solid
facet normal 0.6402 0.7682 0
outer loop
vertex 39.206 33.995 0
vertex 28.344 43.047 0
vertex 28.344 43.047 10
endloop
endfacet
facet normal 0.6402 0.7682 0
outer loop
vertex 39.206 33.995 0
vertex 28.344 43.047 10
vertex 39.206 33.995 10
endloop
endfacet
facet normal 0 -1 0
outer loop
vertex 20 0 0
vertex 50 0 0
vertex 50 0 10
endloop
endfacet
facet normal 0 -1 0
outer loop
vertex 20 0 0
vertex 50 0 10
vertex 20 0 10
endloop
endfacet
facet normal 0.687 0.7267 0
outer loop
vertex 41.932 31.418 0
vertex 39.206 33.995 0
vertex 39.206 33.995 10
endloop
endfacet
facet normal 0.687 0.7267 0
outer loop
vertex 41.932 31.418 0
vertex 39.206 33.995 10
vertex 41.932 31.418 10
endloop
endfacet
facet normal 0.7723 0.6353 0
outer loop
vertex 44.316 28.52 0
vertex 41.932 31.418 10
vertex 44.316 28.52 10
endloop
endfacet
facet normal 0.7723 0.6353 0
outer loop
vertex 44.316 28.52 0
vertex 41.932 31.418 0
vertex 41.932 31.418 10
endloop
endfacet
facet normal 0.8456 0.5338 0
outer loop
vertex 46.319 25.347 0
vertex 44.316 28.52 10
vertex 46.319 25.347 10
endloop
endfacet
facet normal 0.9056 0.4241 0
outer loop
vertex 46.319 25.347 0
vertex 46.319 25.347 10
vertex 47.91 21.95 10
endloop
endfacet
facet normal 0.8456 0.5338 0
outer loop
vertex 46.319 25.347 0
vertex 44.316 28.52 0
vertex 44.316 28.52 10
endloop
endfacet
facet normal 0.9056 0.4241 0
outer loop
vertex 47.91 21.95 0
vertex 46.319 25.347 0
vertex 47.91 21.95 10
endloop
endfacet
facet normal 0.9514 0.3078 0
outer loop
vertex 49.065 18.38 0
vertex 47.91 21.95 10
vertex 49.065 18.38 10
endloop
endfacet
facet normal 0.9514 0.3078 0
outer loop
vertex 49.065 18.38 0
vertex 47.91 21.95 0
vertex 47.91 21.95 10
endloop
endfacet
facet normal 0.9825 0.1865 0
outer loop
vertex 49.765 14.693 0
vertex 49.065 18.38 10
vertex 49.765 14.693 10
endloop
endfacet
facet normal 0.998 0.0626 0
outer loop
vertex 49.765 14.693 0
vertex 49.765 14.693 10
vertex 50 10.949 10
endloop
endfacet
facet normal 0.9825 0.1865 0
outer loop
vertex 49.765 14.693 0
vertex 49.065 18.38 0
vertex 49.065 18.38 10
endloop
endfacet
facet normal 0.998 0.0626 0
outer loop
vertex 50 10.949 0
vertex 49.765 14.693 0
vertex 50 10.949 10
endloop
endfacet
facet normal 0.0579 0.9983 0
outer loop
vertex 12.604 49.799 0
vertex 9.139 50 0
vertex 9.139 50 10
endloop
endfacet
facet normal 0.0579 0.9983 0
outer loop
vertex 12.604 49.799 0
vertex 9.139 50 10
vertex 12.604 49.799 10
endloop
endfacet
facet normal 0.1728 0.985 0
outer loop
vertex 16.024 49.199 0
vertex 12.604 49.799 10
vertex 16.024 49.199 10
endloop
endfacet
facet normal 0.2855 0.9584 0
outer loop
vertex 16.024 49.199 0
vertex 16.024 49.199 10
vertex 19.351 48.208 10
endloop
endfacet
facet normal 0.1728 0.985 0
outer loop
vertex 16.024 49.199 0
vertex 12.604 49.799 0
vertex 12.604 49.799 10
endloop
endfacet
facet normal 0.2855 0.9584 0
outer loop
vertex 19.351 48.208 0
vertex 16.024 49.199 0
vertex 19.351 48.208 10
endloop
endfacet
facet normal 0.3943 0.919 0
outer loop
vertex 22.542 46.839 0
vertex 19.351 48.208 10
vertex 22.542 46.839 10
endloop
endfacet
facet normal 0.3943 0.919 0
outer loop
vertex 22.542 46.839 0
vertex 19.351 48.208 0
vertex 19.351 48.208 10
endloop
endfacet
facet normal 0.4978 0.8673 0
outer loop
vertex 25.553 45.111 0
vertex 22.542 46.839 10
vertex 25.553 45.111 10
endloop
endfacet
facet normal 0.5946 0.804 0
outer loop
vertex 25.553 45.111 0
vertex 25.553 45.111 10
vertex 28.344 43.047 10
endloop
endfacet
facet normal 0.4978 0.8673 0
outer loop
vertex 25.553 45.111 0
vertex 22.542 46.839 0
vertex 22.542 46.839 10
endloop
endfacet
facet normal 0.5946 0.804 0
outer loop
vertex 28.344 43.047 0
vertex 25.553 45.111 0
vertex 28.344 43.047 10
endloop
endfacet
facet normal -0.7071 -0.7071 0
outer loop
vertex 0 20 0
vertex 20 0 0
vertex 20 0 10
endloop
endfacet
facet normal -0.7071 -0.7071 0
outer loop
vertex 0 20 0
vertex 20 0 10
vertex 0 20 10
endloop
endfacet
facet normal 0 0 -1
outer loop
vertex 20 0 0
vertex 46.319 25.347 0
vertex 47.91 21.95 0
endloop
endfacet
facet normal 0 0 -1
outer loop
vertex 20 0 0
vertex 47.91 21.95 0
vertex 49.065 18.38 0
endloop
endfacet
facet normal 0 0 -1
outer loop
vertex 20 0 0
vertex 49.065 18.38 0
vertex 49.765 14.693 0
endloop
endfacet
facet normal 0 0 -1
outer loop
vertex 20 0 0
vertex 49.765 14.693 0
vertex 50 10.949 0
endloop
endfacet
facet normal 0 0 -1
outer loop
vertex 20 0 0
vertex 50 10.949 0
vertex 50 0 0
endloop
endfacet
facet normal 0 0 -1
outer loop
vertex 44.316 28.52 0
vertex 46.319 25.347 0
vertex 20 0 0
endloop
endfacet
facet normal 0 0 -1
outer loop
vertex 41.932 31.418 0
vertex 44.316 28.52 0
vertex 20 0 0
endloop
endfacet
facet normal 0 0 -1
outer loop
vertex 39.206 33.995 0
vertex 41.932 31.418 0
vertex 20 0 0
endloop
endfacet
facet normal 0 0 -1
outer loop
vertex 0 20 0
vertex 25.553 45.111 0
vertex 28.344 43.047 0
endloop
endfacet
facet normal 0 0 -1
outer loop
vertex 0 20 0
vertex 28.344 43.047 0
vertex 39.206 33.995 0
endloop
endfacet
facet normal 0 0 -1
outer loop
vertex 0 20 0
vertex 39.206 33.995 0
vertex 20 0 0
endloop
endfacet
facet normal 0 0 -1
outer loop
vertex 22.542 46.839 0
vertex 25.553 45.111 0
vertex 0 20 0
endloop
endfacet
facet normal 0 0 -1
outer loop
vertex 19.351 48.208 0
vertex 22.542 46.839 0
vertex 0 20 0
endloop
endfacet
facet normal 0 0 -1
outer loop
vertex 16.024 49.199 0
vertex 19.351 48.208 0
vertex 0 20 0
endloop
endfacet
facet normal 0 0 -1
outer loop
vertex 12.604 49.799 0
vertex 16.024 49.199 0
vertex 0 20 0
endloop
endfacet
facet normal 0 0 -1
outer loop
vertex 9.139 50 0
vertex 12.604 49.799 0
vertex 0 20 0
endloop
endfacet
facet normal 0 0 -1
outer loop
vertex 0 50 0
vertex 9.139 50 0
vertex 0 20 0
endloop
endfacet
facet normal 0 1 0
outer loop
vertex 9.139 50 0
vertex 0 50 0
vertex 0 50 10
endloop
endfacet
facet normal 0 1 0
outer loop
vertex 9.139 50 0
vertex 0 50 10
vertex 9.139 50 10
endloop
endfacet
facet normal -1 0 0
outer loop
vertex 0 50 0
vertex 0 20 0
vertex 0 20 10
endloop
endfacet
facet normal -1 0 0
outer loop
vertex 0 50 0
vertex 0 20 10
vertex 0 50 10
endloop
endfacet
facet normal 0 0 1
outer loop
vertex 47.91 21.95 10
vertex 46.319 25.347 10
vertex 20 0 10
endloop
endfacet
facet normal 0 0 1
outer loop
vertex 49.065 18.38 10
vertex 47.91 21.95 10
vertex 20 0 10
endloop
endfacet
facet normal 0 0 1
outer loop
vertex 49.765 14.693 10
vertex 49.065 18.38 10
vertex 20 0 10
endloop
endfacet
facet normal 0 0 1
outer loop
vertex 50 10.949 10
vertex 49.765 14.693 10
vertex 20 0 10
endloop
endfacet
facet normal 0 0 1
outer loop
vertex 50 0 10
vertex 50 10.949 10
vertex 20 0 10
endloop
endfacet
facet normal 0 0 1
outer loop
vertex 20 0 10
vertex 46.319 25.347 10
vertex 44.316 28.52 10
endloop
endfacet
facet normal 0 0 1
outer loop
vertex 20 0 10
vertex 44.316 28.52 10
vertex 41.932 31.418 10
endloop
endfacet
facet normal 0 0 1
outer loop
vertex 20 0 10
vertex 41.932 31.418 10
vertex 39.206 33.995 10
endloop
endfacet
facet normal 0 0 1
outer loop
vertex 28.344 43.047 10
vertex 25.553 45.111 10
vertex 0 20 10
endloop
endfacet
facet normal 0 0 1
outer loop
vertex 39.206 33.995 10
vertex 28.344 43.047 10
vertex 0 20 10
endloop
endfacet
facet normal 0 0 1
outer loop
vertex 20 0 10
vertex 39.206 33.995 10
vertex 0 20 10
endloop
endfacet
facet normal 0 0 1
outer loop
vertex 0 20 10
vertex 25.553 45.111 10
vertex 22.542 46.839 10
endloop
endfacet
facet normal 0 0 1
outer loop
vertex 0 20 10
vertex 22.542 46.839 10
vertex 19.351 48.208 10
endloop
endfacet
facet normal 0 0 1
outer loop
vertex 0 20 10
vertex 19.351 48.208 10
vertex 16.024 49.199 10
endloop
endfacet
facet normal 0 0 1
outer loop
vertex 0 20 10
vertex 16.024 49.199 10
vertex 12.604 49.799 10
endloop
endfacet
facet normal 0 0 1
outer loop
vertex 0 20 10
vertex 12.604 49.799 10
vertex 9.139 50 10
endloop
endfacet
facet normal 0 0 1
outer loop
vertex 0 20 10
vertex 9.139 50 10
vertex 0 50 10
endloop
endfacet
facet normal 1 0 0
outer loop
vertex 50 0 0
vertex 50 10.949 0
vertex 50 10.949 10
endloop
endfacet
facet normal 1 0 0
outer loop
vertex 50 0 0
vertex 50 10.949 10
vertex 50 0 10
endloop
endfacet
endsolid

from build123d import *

# Parameters (mm, degrees)
BOSS_EXTRU_1_DEPTH = 10


with BuildPart() as part:
    # Esquisse1 → Boss.-Extru.1 (new body)
    with BuildSketch(Plane.XY):
        with BuildLine():
            Line((0, 20), (0, 50))
            Line((0, 50), (9.138501945, 50))
            ThreePointArc((9.138501945, 50), (19.351259857, 48.20814733), (28.344033934, 43.046638388))
            Line((28.344033934, 43.046638388), (39.20553199, 33.995390008))
            ThreePointArc((39.20553199, 33.995390008), (47.167682637, 23.673413508), (50, 10.94875162))
            Line((50, 10.94875162), (50, 0))
            Line((50, 0), (20, 0))
            Line((20, 0), (0, 20))
        make_face()
    extrude(amount=BOSS_EXTRU_1_DEPTH)


solid = part.part
